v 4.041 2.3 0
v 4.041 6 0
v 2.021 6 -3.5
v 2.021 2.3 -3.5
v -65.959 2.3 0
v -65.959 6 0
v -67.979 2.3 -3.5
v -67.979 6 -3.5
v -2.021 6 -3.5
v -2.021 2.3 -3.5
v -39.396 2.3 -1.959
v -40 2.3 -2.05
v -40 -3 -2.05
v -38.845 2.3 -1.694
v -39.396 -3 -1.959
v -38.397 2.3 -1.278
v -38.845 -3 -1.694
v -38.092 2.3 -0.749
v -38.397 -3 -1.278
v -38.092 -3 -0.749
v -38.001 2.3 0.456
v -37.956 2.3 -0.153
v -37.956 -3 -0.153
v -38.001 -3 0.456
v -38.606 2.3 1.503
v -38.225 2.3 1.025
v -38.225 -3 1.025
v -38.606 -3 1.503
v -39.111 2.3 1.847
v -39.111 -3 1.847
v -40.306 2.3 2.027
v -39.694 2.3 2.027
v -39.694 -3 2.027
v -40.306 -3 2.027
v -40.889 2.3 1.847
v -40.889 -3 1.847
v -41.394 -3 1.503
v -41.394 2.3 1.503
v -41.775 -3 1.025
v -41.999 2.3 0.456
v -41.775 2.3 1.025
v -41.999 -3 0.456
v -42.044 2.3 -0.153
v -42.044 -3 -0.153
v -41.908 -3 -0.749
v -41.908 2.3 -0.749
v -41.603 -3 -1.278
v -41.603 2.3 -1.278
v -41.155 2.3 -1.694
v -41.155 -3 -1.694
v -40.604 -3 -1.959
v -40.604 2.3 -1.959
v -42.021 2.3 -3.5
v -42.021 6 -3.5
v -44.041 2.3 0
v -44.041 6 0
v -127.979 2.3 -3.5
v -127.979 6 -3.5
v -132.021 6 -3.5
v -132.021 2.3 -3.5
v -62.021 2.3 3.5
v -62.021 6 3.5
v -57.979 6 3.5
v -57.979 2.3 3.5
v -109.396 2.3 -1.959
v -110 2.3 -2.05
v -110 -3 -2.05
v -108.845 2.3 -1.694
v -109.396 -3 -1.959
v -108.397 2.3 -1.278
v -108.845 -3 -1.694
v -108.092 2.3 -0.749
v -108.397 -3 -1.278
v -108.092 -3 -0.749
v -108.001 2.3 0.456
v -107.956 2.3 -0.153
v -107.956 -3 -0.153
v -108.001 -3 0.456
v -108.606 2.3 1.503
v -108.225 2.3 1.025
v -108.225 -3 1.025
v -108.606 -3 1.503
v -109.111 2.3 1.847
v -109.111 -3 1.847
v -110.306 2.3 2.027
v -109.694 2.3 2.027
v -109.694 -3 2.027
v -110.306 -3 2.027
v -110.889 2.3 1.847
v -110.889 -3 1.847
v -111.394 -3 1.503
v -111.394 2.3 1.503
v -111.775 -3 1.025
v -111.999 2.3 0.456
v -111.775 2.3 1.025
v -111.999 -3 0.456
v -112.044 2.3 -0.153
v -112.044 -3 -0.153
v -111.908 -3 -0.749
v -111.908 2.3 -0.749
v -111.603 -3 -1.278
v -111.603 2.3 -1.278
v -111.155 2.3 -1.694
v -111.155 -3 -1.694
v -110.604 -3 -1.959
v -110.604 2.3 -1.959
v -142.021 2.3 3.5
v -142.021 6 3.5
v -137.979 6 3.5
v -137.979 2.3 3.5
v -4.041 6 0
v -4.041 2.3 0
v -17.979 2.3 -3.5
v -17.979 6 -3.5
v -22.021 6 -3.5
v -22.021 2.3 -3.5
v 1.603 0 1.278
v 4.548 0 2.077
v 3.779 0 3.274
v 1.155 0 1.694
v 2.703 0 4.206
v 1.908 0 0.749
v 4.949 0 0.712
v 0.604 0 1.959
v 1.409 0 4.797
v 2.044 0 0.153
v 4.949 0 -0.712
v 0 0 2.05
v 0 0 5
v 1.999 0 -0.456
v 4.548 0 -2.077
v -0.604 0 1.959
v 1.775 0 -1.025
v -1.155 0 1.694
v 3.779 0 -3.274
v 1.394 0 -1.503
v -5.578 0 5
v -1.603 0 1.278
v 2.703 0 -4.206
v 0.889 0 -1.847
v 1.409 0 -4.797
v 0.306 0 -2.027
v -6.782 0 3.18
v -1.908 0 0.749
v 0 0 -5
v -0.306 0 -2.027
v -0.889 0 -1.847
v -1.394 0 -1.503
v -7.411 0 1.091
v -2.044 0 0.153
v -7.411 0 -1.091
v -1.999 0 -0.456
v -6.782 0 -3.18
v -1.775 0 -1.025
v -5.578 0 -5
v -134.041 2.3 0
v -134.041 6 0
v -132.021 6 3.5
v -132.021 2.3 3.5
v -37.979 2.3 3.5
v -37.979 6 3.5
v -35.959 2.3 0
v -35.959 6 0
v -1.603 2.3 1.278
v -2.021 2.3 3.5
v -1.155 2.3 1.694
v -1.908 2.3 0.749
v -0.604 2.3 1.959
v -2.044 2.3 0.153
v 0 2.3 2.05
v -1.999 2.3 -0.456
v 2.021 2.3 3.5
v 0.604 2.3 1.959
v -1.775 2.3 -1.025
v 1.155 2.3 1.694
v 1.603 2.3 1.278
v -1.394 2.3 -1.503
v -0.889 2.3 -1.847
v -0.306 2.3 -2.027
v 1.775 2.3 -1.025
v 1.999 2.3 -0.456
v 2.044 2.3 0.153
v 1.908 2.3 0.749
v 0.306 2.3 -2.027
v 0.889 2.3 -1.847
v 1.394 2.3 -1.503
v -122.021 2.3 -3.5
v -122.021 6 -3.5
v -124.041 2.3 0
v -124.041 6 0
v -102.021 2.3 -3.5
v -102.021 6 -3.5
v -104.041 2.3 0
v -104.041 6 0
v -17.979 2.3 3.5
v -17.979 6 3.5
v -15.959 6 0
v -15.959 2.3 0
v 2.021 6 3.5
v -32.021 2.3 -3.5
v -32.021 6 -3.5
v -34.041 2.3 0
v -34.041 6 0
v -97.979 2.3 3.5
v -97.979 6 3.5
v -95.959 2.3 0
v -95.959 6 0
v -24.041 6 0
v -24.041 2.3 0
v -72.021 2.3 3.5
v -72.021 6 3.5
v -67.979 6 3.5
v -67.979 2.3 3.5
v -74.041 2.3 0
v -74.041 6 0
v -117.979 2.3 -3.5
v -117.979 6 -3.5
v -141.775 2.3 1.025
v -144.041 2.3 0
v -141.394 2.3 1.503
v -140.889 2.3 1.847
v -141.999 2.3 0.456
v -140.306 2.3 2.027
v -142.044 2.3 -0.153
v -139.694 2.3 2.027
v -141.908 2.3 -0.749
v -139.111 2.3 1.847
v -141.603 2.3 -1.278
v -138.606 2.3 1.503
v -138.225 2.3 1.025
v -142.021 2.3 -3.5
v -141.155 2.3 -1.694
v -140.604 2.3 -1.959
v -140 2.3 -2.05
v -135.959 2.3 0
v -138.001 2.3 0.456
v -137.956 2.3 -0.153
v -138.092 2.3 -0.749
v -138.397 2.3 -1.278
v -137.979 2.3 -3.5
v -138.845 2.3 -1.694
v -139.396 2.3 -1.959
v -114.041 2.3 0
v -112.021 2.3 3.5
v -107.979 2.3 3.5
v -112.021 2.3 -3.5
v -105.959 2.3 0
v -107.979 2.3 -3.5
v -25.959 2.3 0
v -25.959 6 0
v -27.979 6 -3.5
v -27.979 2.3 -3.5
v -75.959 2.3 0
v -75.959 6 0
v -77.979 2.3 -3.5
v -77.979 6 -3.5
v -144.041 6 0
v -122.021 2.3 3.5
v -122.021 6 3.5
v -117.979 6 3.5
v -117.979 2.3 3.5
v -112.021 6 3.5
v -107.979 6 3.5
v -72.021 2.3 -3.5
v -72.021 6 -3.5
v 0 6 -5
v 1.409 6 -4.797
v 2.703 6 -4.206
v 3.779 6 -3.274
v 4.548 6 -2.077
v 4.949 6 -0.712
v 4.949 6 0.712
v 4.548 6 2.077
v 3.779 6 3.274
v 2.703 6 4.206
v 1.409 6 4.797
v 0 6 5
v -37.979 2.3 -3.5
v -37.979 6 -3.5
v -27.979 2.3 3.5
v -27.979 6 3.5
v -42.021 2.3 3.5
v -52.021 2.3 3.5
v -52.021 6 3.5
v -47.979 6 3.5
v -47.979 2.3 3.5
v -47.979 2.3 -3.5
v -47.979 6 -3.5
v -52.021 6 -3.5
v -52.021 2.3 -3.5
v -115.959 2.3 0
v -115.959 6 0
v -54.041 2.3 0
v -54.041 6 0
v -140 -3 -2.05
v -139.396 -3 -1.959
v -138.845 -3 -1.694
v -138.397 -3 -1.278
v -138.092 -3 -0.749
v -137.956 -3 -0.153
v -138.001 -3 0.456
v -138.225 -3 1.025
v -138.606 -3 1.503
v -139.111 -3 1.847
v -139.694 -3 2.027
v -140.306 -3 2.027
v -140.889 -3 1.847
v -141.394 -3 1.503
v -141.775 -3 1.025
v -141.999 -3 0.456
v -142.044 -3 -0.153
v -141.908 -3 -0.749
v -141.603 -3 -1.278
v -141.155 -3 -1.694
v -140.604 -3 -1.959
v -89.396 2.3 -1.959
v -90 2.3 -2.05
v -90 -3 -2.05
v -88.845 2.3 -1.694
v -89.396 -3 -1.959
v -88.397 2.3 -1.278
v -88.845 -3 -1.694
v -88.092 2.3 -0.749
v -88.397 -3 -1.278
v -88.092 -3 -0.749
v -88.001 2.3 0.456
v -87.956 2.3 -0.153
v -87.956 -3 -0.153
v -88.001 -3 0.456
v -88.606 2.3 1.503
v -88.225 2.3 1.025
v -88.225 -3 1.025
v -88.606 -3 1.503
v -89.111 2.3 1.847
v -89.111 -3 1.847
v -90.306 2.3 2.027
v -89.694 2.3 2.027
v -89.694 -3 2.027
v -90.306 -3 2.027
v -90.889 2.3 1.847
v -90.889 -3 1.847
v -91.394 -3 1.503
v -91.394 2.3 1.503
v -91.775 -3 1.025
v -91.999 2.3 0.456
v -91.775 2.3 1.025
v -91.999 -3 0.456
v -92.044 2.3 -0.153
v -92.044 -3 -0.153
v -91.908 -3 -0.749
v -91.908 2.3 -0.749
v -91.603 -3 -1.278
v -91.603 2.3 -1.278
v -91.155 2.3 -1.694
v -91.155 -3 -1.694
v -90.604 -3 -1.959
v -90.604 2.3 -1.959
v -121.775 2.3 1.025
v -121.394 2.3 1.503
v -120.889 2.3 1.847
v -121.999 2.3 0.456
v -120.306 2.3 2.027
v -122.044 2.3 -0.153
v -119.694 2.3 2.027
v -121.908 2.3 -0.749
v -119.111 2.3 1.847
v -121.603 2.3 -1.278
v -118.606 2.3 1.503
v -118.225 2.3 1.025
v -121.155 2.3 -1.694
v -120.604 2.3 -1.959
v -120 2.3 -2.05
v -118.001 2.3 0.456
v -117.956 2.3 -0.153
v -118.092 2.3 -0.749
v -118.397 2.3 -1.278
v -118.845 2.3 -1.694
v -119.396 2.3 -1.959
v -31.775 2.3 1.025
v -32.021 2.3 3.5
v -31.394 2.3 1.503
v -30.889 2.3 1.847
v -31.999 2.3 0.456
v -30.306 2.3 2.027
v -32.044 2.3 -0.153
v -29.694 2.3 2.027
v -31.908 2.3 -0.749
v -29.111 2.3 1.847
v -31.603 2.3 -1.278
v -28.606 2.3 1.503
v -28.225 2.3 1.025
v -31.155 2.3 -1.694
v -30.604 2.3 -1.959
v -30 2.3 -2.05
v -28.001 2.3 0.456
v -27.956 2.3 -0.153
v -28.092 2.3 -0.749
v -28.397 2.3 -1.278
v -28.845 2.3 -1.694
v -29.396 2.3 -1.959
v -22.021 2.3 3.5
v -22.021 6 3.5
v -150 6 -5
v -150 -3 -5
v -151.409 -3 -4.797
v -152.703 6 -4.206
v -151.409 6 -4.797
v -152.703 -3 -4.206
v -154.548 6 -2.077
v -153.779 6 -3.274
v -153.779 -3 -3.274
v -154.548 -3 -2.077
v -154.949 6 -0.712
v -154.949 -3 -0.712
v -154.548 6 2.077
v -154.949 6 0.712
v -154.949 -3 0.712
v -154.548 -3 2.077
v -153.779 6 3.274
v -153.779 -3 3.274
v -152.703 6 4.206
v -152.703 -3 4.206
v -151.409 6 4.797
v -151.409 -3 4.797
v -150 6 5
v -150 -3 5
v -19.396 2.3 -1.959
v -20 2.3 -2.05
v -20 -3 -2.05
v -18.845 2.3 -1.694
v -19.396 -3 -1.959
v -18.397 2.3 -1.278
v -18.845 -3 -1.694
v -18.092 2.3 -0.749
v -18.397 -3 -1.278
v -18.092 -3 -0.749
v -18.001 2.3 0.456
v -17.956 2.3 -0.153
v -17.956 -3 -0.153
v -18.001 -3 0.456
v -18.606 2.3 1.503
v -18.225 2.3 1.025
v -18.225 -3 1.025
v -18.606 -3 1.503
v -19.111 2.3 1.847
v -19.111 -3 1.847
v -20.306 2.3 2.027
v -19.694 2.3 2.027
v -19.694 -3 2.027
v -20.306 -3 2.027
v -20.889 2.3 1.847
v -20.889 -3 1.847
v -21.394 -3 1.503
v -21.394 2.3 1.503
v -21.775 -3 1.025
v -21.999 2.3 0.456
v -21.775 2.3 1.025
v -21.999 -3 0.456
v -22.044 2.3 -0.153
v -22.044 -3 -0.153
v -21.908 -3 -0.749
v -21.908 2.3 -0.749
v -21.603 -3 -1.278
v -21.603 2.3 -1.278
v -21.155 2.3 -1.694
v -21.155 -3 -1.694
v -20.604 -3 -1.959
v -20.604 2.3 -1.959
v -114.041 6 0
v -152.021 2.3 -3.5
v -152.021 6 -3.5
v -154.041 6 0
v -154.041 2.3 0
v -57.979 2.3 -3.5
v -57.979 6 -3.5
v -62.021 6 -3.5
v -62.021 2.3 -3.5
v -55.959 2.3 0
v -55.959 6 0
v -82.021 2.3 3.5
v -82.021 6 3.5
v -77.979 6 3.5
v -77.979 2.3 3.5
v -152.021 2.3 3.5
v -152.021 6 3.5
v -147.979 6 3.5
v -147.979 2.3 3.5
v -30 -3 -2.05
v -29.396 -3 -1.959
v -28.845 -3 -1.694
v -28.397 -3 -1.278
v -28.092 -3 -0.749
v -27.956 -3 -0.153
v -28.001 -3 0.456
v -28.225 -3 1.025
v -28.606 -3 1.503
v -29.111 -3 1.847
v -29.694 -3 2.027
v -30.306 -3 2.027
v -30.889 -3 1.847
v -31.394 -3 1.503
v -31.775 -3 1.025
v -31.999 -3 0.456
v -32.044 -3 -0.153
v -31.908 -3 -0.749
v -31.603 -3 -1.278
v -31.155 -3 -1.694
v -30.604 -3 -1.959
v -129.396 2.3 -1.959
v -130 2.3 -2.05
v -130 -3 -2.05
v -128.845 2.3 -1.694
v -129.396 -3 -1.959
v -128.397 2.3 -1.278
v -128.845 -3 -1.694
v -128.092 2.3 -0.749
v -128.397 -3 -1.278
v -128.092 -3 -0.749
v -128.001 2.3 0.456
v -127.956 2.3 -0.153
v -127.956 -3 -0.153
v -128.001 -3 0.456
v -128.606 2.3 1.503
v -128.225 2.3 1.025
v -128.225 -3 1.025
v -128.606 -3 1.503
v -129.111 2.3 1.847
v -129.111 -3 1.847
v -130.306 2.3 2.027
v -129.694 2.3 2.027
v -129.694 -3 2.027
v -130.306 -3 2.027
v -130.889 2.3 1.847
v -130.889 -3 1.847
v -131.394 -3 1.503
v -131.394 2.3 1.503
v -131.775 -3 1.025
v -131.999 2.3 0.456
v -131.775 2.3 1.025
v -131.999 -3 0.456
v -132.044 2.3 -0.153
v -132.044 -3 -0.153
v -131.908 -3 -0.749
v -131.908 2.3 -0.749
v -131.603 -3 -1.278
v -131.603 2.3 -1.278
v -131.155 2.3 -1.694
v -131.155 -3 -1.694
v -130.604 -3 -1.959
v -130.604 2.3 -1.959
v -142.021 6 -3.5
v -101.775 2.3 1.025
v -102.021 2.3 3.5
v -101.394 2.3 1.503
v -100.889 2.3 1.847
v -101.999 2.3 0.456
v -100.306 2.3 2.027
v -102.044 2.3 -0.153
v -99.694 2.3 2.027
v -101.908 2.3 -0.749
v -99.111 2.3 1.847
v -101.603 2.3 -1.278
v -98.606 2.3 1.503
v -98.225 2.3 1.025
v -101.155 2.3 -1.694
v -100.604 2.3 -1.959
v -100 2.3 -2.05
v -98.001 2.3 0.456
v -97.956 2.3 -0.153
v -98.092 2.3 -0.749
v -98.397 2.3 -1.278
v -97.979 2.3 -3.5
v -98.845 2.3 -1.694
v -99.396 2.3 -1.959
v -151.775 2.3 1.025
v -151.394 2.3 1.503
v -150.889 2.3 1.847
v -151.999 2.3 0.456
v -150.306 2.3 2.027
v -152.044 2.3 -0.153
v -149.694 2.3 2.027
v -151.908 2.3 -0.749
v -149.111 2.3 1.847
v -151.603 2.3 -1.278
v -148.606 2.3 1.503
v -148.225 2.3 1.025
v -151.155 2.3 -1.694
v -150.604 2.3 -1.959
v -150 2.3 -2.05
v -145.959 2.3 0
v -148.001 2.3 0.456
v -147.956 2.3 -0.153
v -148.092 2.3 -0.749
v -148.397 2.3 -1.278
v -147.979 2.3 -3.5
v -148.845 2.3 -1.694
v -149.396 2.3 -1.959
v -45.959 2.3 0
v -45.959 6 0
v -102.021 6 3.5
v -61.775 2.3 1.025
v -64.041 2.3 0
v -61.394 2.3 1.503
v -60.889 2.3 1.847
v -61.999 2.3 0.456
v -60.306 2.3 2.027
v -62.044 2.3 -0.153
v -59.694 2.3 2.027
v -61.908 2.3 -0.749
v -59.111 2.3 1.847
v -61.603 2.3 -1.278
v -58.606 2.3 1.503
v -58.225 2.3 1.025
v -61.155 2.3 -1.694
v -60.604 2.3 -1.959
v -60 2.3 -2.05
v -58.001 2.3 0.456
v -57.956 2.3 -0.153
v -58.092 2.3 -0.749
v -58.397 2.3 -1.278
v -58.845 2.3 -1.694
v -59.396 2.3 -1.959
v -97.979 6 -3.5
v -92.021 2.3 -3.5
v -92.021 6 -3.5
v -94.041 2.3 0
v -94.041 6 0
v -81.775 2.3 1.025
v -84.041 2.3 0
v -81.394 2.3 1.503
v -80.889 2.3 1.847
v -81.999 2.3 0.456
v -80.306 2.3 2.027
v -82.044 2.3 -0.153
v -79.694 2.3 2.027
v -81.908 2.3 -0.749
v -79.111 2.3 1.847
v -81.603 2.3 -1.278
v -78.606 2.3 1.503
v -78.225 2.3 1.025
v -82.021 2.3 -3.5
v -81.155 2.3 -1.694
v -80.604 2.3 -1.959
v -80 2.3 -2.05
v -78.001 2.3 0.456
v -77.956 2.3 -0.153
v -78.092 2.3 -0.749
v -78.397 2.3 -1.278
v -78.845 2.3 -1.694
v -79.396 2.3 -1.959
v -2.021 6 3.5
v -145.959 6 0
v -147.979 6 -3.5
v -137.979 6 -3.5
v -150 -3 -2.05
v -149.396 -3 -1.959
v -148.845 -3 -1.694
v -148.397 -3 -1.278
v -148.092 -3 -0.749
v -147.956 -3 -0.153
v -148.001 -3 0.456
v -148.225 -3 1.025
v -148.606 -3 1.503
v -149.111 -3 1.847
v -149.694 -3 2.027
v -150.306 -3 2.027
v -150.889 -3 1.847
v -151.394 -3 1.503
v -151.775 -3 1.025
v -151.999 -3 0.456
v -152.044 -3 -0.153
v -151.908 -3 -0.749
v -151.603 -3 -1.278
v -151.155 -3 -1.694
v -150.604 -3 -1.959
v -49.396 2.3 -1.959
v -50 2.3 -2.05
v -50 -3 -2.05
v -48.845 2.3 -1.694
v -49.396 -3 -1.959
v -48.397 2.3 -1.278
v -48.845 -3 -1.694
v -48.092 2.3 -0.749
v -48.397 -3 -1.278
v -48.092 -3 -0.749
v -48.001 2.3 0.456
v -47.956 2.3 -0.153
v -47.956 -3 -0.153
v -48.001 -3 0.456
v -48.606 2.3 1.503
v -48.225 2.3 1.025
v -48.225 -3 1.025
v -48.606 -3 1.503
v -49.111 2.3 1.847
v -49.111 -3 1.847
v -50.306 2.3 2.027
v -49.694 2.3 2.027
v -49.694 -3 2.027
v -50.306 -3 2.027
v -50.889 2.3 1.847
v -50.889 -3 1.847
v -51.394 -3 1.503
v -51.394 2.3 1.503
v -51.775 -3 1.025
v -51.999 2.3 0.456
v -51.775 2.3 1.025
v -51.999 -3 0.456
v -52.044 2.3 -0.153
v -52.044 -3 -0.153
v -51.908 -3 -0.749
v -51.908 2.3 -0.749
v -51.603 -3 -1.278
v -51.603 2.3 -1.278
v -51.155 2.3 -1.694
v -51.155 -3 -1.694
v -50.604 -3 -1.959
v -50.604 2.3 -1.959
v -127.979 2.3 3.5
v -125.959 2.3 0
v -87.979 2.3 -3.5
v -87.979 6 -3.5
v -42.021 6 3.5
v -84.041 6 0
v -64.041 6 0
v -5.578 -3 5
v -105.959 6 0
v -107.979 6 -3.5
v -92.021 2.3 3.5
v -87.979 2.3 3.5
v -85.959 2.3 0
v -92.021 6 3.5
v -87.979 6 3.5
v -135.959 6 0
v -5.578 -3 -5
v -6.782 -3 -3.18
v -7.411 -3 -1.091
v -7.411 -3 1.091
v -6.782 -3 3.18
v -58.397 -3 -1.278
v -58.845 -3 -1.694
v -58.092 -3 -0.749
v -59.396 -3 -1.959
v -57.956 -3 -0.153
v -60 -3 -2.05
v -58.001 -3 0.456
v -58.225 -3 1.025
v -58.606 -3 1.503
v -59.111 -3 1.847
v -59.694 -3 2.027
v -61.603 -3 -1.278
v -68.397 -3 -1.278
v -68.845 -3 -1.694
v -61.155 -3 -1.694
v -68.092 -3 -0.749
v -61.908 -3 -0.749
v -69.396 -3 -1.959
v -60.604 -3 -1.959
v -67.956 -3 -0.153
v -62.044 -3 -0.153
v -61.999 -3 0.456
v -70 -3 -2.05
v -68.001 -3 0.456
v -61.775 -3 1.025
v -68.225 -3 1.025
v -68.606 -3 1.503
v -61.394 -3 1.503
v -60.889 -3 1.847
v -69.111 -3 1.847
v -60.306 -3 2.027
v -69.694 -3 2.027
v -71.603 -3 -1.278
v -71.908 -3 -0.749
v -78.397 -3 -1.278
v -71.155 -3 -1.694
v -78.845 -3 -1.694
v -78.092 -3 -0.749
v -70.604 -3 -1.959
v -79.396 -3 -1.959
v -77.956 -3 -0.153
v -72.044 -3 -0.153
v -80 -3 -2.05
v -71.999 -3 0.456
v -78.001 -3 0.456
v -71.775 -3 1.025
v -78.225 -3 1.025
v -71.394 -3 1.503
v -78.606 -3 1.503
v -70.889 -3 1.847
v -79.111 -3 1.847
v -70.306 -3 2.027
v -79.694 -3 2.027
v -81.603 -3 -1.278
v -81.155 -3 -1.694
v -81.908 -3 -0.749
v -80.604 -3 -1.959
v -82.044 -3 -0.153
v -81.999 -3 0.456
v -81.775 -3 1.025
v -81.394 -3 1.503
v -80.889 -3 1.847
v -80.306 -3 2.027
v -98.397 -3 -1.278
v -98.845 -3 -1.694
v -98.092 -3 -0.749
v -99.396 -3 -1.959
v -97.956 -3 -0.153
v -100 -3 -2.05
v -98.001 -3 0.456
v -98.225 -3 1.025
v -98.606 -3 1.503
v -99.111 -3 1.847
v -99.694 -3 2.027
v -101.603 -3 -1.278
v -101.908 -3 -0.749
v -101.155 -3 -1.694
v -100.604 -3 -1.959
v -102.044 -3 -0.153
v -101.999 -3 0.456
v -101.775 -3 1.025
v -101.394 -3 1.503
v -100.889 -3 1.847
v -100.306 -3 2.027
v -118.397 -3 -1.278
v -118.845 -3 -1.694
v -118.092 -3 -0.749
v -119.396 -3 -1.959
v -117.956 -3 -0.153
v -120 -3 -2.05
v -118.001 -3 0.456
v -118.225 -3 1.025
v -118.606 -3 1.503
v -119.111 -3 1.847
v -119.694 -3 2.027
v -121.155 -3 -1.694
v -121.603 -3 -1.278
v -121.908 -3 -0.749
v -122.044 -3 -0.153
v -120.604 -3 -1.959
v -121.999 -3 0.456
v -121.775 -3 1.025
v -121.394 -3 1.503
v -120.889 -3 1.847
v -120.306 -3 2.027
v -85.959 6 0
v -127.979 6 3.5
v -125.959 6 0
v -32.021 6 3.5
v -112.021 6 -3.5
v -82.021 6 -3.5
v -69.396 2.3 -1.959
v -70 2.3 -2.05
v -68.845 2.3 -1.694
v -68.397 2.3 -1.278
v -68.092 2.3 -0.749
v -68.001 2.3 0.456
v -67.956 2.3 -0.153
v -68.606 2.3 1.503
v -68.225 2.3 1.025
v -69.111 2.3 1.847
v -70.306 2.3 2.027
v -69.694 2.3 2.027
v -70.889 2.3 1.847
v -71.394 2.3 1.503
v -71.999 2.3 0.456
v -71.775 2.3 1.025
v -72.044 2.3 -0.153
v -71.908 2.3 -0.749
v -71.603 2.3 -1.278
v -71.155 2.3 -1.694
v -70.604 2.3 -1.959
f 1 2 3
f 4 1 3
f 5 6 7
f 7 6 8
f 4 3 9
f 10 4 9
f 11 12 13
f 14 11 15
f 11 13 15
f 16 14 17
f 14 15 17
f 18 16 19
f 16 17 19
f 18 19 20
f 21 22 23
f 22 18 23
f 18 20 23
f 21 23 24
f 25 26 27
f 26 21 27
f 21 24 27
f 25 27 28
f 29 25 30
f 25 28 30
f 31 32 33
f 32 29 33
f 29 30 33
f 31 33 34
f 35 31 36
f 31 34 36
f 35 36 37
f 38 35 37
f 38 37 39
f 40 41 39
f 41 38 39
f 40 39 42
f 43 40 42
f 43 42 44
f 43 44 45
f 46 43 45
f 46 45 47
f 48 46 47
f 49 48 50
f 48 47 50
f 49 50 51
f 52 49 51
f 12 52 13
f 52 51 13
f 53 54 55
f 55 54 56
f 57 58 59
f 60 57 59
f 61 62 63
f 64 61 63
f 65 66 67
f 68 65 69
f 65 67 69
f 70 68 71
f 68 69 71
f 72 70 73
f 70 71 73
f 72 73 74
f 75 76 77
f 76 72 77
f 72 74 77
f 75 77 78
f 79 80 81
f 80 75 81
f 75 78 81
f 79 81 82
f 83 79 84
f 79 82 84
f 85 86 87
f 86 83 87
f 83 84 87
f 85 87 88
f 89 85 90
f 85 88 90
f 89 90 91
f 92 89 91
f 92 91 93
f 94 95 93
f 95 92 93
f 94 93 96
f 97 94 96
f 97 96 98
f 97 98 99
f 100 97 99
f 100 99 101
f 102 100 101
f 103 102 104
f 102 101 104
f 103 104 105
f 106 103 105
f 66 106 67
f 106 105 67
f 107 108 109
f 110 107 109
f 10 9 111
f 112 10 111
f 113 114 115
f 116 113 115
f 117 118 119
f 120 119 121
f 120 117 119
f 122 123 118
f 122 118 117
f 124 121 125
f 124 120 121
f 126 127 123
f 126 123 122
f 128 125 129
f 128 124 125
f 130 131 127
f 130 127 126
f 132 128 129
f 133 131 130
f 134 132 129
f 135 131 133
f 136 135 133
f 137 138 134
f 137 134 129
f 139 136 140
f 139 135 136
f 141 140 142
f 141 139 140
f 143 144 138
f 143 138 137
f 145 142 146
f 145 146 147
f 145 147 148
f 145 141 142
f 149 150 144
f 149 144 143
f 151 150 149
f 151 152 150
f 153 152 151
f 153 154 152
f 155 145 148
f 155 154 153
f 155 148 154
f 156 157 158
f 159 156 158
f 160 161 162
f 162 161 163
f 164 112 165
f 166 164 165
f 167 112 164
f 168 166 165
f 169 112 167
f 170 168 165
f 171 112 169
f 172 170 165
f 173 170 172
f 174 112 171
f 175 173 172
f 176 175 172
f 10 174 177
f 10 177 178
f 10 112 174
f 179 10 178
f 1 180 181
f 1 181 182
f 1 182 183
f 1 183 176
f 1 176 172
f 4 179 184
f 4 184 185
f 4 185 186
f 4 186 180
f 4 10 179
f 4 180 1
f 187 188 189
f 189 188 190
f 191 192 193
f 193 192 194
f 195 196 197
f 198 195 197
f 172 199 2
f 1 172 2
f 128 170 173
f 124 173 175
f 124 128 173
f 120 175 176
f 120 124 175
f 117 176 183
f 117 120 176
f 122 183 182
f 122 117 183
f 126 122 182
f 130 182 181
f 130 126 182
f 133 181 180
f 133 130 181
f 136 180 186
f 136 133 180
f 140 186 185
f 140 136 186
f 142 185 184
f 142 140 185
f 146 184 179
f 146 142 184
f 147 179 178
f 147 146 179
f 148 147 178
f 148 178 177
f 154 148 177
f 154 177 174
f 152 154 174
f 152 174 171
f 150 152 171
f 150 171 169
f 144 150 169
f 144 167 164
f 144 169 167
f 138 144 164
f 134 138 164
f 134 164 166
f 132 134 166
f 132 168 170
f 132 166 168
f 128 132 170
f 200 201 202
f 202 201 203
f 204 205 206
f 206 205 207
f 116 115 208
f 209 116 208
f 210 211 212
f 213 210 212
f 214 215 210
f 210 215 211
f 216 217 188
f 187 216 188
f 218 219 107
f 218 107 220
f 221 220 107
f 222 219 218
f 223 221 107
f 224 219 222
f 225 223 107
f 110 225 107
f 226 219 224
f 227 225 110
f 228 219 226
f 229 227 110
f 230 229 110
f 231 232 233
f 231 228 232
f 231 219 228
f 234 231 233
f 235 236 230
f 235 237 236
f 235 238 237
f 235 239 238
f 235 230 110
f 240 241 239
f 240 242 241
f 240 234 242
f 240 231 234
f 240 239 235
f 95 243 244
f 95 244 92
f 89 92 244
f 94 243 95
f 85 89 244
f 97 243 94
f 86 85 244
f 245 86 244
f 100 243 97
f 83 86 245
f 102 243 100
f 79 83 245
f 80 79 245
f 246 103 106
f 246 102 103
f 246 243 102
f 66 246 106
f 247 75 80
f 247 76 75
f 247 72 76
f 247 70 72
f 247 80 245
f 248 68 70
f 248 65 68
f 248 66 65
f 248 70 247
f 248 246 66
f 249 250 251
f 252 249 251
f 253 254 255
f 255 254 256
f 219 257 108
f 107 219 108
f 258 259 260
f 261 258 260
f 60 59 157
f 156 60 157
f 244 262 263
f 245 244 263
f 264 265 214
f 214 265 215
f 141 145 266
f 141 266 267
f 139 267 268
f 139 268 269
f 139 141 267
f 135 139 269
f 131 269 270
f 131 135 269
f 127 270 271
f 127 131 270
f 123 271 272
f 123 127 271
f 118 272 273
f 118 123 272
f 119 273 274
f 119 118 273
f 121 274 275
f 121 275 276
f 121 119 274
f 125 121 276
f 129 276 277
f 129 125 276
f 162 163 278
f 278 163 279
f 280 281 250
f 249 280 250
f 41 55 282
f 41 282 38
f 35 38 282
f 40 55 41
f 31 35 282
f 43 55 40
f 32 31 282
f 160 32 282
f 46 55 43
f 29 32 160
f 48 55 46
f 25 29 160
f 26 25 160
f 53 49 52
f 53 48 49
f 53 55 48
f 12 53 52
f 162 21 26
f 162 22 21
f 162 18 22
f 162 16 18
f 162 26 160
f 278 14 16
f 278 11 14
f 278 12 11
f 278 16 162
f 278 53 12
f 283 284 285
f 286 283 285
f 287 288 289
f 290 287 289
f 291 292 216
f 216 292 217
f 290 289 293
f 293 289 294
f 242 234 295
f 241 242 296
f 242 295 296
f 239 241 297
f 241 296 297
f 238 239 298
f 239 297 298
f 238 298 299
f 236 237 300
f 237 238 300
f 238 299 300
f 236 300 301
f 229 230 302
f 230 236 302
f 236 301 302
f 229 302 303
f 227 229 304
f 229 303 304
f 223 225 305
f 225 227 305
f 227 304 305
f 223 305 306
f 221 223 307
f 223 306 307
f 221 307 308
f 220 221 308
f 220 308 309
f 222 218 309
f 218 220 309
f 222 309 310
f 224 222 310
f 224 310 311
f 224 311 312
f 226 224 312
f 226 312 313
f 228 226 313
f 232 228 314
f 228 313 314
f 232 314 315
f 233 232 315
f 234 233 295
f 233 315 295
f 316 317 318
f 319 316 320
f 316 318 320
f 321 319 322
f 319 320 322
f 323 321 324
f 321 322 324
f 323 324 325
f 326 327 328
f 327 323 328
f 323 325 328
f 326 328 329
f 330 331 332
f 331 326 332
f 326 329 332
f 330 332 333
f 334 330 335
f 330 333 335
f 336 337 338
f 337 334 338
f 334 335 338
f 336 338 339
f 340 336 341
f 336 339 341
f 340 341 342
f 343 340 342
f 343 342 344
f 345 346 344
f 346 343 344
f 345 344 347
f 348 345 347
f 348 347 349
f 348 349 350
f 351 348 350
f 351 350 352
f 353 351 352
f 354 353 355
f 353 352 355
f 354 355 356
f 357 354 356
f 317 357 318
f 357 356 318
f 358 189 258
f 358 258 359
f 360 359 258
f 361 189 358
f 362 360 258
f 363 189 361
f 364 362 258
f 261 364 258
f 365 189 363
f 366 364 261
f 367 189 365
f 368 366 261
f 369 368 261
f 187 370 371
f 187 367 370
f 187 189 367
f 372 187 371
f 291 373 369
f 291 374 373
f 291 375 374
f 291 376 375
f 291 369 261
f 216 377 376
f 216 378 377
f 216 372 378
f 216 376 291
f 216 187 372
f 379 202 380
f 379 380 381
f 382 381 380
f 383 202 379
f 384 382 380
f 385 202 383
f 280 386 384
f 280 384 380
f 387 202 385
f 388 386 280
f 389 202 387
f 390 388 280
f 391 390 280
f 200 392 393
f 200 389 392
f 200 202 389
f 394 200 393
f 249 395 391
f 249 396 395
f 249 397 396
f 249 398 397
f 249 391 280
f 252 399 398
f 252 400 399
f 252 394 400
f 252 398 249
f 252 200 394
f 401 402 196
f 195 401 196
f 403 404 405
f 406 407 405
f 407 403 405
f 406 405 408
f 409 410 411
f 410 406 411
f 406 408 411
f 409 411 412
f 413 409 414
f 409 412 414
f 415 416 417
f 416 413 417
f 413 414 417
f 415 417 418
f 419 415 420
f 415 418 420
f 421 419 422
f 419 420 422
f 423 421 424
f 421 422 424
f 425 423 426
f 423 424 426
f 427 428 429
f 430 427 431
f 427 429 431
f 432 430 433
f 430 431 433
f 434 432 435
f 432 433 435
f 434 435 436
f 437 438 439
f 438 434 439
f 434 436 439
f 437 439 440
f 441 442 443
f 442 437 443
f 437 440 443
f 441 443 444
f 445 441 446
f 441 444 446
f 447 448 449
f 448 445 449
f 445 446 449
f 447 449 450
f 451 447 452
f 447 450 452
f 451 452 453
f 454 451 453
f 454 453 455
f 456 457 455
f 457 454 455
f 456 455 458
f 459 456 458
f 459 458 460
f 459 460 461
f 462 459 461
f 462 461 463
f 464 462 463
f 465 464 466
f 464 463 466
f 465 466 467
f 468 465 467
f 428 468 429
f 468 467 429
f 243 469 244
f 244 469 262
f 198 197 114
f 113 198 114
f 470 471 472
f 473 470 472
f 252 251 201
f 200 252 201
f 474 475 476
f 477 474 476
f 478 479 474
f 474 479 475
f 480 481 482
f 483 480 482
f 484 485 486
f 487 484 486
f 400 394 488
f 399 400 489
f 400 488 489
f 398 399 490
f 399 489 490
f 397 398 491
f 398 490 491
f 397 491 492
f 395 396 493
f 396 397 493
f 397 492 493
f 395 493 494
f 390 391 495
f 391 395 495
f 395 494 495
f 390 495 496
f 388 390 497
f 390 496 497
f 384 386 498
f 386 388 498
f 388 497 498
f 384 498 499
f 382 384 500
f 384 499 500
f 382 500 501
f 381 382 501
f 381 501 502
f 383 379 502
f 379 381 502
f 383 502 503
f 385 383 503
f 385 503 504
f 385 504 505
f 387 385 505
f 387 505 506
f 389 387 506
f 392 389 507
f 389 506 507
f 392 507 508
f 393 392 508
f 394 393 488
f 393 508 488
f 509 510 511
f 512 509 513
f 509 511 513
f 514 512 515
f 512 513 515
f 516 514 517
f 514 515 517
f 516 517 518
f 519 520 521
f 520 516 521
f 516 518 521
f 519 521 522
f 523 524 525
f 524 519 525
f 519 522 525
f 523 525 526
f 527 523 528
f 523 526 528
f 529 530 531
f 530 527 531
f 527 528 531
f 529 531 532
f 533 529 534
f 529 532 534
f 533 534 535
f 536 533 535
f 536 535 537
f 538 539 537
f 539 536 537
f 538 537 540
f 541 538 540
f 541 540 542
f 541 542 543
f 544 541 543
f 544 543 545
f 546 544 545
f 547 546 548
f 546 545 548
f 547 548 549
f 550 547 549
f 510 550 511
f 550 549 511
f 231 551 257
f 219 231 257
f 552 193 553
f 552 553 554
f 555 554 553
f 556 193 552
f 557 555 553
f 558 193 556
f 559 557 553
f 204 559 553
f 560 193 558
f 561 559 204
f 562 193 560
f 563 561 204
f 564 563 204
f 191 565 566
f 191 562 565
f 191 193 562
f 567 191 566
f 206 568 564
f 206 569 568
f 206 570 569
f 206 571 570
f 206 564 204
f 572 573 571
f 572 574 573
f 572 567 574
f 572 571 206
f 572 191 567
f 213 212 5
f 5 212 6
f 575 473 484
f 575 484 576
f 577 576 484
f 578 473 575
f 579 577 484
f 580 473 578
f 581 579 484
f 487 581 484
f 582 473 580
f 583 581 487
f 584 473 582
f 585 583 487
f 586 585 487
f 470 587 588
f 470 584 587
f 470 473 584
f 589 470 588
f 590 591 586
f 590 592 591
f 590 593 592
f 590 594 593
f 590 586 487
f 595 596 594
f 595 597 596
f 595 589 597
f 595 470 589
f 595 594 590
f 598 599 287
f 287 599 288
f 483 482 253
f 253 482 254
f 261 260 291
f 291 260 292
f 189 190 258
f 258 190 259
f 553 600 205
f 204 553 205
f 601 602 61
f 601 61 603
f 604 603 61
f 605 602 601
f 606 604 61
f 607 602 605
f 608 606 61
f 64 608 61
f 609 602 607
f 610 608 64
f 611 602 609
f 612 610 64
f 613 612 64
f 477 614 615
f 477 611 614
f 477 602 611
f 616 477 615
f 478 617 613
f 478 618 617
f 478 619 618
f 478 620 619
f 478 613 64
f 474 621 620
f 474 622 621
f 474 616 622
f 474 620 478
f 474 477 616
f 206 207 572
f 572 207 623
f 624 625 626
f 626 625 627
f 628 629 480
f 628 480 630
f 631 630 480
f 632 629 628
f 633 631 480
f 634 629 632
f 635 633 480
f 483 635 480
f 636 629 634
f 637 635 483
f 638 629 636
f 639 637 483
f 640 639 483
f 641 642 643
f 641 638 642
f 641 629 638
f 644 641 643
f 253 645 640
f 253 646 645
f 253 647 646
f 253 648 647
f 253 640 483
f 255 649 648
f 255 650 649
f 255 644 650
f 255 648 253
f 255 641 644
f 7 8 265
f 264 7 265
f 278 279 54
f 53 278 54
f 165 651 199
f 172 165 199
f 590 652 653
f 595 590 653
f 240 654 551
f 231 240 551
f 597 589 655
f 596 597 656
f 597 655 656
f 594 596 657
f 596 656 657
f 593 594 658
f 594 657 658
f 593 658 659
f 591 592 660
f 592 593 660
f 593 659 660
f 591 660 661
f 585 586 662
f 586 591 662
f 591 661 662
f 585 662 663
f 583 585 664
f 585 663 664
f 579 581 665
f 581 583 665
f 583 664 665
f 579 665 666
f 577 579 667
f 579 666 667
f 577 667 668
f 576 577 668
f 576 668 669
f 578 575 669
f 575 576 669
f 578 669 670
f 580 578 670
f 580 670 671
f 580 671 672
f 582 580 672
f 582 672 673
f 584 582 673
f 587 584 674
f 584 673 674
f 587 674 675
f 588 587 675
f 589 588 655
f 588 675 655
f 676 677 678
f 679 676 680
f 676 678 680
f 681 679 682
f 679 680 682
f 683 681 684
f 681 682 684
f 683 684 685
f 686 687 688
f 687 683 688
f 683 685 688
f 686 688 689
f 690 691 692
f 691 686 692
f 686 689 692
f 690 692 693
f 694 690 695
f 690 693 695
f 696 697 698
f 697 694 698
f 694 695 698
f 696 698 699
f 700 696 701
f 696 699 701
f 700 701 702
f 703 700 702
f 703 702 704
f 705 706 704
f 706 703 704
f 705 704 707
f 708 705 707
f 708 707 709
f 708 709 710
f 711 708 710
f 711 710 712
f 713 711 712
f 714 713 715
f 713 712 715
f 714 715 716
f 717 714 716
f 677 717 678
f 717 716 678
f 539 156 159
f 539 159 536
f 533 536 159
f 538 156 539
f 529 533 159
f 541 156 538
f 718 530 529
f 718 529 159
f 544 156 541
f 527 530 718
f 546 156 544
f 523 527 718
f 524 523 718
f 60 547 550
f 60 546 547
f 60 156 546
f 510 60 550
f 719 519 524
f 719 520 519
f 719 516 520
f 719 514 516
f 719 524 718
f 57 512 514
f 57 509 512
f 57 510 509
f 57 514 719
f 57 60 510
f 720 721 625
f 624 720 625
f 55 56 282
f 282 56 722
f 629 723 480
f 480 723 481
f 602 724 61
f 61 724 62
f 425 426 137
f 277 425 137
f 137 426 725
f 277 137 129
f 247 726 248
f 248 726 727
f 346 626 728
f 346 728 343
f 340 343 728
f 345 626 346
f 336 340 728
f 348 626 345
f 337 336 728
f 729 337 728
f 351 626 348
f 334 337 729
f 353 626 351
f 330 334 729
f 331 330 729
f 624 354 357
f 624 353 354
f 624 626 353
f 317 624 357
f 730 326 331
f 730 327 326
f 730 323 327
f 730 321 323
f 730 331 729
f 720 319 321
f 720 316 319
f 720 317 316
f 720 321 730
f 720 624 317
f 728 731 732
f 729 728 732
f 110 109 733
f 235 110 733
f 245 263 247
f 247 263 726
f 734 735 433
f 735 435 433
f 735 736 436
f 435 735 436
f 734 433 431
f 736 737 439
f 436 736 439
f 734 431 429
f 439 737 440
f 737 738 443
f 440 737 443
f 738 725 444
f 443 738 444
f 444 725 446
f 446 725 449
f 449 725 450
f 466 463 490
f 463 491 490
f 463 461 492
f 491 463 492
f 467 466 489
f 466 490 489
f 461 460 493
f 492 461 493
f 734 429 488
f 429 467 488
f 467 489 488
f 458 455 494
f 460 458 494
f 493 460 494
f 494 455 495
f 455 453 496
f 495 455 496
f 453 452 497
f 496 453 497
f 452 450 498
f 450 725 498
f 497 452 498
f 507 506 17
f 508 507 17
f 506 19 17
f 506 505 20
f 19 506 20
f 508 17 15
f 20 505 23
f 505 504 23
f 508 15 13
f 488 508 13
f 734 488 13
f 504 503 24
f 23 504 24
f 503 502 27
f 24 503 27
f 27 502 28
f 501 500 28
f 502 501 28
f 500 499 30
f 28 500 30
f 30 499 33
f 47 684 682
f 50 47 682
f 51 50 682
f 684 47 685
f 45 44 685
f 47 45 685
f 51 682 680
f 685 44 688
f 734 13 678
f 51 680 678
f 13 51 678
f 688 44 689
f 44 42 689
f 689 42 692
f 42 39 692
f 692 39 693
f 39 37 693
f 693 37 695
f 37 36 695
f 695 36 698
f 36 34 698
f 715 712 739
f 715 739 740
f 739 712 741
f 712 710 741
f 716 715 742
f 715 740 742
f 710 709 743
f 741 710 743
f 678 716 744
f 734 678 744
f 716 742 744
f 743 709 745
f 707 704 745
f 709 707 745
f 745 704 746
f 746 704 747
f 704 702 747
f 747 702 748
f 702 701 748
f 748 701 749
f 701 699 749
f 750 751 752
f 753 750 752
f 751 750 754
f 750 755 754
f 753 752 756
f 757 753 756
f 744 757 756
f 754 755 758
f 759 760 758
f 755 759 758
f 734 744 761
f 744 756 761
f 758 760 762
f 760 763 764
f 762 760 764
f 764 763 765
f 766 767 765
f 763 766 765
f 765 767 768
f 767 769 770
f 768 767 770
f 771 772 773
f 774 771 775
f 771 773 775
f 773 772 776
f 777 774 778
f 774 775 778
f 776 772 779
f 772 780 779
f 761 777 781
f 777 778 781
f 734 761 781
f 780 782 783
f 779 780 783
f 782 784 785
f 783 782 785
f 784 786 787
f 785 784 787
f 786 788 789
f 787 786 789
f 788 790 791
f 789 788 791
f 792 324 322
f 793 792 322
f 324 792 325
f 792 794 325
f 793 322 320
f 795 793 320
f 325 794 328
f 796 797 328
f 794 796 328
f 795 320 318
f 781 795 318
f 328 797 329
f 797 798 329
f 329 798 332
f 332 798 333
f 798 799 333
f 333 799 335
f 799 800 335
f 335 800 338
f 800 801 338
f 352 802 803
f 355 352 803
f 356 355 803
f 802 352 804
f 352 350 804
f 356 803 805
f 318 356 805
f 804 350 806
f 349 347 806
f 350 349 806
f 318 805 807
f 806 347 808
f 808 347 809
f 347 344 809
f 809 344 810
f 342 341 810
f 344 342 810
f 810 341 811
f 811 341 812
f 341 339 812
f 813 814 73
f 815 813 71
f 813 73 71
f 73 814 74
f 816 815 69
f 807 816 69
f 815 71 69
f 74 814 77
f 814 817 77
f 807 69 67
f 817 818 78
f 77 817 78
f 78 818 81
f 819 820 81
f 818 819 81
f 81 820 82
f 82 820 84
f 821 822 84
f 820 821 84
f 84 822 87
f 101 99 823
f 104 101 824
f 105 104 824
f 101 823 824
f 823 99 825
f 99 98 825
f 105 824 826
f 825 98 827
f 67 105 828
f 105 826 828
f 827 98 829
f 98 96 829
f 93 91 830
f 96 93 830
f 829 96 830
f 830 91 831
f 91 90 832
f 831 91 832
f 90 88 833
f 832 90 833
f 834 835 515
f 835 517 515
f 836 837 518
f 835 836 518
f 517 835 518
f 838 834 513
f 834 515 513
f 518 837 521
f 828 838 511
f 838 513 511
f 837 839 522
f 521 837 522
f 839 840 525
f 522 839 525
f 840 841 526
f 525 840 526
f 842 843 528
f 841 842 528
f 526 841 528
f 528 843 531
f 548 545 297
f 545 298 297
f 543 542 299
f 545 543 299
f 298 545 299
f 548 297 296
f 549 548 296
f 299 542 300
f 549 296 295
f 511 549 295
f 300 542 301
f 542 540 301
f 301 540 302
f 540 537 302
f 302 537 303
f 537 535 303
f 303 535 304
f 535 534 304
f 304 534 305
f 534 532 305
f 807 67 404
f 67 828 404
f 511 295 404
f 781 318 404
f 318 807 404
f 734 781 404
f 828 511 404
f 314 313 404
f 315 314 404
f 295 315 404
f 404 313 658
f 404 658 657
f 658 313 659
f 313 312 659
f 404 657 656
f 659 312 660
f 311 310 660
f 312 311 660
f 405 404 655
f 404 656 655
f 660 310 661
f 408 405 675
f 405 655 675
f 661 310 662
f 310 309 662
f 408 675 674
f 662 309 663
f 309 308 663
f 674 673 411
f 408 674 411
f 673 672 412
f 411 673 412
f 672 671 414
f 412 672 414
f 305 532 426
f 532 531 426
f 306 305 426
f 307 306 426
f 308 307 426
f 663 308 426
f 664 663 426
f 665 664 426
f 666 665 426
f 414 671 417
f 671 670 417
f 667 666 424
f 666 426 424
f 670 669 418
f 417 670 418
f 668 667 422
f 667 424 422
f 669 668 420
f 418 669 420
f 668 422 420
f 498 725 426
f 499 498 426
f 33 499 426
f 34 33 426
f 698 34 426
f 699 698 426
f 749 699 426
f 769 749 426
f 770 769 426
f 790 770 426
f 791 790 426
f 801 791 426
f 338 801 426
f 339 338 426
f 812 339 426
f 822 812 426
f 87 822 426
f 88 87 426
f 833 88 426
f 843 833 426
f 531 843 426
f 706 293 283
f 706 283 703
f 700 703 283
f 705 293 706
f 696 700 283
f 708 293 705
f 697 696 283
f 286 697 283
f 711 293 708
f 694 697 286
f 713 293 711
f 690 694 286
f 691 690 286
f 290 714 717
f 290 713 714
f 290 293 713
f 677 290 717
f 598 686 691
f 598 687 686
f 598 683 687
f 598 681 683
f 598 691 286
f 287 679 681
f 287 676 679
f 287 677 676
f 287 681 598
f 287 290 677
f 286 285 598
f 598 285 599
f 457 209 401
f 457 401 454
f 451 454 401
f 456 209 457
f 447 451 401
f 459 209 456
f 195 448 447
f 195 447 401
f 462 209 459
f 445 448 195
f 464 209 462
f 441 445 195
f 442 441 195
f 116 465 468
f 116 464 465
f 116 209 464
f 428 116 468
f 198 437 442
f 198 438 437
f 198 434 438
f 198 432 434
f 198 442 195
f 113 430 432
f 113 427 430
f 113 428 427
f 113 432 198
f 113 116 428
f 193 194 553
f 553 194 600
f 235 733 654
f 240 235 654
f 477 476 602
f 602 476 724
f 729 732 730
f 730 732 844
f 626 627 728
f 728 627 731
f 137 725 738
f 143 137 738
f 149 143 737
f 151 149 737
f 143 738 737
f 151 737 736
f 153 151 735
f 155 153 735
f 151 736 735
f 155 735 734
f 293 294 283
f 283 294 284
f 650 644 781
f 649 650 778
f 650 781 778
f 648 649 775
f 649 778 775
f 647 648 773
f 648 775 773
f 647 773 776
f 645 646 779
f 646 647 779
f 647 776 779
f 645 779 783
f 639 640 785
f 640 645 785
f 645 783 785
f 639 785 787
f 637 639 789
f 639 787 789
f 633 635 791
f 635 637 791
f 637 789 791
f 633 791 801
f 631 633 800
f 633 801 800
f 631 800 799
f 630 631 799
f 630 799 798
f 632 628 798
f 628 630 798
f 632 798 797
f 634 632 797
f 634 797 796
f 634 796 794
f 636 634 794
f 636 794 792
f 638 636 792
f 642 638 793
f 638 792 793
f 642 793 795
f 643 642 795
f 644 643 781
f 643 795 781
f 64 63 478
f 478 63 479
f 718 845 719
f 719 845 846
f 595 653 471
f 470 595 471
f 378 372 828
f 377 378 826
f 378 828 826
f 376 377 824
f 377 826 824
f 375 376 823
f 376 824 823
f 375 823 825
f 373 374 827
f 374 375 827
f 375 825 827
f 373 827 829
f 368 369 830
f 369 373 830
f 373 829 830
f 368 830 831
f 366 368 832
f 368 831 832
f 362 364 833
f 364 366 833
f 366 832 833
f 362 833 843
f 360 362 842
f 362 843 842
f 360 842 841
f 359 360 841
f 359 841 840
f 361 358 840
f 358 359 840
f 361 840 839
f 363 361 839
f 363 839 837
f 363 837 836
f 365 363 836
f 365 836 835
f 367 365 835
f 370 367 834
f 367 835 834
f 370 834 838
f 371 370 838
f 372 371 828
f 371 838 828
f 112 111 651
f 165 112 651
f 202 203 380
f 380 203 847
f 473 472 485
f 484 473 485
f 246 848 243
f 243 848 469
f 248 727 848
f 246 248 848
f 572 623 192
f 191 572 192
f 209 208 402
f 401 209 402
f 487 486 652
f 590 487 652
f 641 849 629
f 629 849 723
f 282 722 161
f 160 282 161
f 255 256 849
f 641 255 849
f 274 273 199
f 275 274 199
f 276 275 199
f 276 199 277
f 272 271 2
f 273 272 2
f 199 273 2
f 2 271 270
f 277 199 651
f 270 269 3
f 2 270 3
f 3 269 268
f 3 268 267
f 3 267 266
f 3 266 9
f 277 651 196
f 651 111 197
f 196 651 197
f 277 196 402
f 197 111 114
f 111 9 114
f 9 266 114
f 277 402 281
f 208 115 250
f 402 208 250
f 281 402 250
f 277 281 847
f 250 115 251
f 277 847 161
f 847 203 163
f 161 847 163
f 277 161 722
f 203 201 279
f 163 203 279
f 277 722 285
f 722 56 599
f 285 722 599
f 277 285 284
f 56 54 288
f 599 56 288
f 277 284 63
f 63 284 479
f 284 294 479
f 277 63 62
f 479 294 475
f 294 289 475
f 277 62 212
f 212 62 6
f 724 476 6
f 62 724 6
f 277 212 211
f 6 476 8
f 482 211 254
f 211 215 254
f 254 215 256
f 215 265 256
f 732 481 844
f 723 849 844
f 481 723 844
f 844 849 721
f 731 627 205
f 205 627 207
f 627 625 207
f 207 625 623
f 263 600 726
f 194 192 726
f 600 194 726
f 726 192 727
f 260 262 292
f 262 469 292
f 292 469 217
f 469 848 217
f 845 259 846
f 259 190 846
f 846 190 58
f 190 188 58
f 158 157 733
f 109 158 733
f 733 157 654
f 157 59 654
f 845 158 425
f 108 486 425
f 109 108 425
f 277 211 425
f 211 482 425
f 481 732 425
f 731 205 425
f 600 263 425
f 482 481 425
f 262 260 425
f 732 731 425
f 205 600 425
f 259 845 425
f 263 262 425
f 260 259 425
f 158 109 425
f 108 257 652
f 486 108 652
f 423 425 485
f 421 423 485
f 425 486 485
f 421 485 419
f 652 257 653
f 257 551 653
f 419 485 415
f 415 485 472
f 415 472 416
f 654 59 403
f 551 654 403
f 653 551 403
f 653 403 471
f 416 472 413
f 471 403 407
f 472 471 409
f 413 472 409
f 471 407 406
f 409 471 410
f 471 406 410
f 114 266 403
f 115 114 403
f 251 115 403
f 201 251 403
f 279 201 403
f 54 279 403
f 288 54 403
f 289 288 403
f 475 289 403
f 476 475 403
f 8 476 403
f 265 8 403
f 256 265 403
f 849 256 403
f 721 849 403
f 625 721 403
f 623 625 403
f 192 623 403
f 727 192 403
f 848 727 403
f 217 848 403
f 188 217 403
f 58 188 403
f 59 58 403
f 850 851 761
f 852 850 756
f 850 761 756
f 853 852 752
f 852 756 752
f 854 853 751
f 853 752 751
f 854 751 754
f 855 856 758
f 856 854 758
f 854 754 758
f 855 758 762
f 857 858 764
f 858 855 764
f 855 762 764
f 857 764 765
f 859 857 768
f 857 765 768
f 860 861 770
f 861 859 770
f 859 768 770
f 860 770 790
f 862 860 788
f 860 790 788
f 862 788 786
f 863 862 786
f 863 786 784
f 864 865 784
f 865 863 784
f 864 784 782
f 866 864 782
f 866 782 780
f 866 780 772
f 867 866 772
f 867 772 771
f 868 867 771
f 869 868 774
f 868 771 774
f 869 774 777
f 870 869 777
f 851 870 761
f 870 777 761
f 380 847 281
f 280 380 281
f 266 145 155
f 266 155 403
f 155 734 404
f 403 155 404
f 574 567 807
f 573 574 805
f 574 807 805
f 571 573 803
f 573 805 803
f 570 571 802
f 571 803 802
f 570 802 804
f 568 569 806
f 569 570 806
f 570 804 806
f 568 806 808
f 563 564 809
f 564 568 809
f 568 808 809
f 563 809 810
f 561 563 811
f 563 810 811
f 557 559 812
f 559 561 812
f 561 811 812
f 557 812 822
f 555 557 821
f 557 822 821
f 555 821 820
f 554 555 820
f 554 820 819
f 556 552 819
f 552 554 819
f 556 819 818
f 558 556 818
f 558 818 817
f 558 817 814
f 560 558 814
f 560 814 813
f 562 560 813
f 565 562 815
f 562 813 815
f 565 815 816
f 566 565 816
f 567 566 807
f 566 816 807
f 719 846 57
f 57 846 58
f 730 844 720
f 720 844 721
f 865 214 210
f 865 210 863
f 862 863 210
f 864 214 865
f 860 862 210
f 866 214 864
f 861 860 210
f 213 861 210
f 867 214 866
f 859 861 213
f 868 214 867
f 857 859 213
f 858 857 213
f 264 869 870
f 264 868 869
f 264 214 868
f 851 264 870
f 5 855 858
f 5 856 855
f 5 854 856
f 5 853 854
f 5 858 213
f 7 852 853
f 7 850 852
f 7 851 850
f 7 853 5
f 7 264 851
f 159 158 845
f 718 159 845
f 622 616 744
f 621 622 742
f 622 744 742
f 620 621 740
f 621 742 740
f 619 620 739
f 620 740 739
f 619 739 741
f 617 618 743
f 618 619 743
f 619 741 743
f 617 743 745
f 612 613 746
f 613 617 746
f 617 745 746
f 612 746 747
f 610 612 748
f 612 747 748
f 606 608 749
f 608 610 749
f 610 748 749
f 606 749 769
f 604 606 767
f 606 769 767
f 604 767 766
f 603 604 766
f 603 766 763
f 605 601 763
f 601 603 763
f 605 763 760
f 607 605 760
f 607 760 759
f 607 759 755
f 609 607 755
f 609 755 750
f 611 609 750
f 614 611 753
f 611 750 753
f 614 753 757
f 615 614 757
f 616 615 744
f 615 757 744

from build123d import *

# Parameters (mm, degrees)
SKETCH1_R           = 2.05
BOSS_EXTRUDE1_DEPTH = 6
CUT_EXTRUDE1_DEPTH  = 3.7
BOSS_EXTRUDE2_START = 3
BOSS_EXTRUDE2_DEPTH = 3
SKETCH5_R           = 2.05
CUT_EXTRUDE2_DEPTH  = 156.341559153


with BuildPart() as part:
    # Sketch1 → Boss-Extrude1 (new body)
    with BuildSketch(Plane(origin=(0, 0, 0), x_dir=(1, 0, 0), z_dir=(0, 1, 0))):
        with BuildLine():
            Line((0, -5), (-150, -5))
            ThreePointArc((-150, -5), (-155, 0), (-150, 5))
            Line((-150, 5), (0, 5))
            ThreePointArc((0, 5), (5, 0), (0, -5))
        make_face()
        with Locations(Location((0, 0, 0), (0, 0, 270))):
            Circle(SKETCH1_R, mode=Mode.SUBTRACT)
        with Locations(Location((-50, 0, 0), (0, 0, 270))):
            Circle(SKETCH1_R, mode=Mode.SUBTRACT)
        with Locations(Location((-60, 0, 0), (0, 0, 270))):
            Circle(SKETCH1_R, mode=Mode.SUBTRACT)
        with Locations(Location((-70, 0, 0), (0, 0, 270))):
            Circle(SKETCH1_R, mode=Mode.SUBTRACT)
        with Locations(Location((-80, 0, 0), (0, 0, 270))):
            Circle(SKETCH1_R, mode=Mode.SUBTRACT)
        with Locations(Location((-90, 0, 0), (0, 0, 270))):
            Circle(SKETCH1_R, mode=Mode.SUBTRACT)
        with Locations(Location((-100, 0, 0), (0, 0, 270))):
            Circle(SKETCH1_R, mode=Mode.SUBTRACT)
        with Locations(Location((-110, 0, 0), (0, 0, 270))):
            Circle(SKETCH1_R, mode=Mode.SUBTRACT)
        with Locations(Location((-120, 0, 0), (0, 0, 270))):
            Circle(SKETCH1_R, mode=Mode.SUBTRACT)
        with Locations(Location((-130, 0, 0), (0, 0, 270))):
            Circle(SKETCH1_R, mode=Mode.SUBTRACT)
        with Locations(Location((-140, 0, 0), (0, 0, 270))):
            Circle(SKETCH1_R, mode=Mode.SUBTRACT)
        with Locations(Location((-150, 0, 0), (0, 0, 270))):
            Circle(SKETCH1_R, mode=Mode.SUBTRACT)
        with Locations(Location((-20, 0, 0), (0, 0, 270))):
            Circle(SKETCH1_R, mode=Mode.SUBTRACT)
        with Locations(Location((-30, 0, 0), (0, 0, 270))):
            Circle(SKETCH1_R, mode=Mode.SUBTRACT)
        with Locations(Location((-40, 0, 0), (0, 0, 270))):
            Circle(SKETCH1_R, mode=Mode.SUBTRACT)
    extrude(amount=BOSS_EXTRUDE1_DEPTH)

    # Sketch2 → Cut-Extrude1 (cut)
    with BuildSketch(Plane(origin=(0, 6, 0), x_dir=(1, 0, 0), z_dir=(0, 1, 0))):
        Polygon((4.041451884, 0), (2.020725942, 3.5), (-2.020725942, 3.5), (-4.041451884, 0), (-2.020725942, -3.5), (2.020725942, -3.5), align=None)
        Polygon((-45.958548116, 0), (-47.979274058, 3.5), (-52.020725942, 3.5), (-54.041451884, 0), (-52.020725942, -3.5), (-47.979274058, -3.5), align=None)
        Polygon((-55.958548116, 0), (-57.979274058, 3.5), (-62.020725942, 3.5), (-64.041451884, 0), (-62.020725942, -3.5), (-57.979274058, -3.5), align=None)
        Polygon((-65.958548116, 0), (-67.979274058, 3.5), (-72.020725942, 3.5), (-74.041451884, 0), (-72.020725942, -3.5), (-67.979274058, -3.5), align=None)
        Polygon((-75.958548116, 0), (-77.979274058, 3.5), (-82.020725942, 3.5), (-84.041451884, 0), (-82.020725942, -3.5), (-77.979274058, -3.5), align=None)
        Polygon((-85.958548116, 0), (-87.979274058, 3.5), (-92.020725942, 3.5), (-94.041451884, 0), (-92.020725942, -3.5), (-87.979274058, -3.5), align=None)
        Polygon((-95.958548116, 0), (-97.979274058, 3.5), (-102.020725942, 3.5), (-104.041451884, 0), (-102.020725942, -3.5), (-97.979274058, -3.5), align=None)
        Polygon((-105.958548116, 0), (-107.979274058, 3.5), (-112.020725942, 3.5), (-114.041451884, 0), (-112.020725942, -3.5), (-107.979274058, -3.5), align=None)
        Polygon((-115.958548116, 0), (-117.979274058, 3.5), (-122.020725942, 3.5), (-124.041451884, 0), (-122.020725942, -3.5), (-117.979274058, -3.5), align=None)
        Polygon((-125.958548116, 0), (-127.979274058, 3.5), (-132.020725942, 3.5), (-134.041451884, 0), (-132.020725942, -3.5), (-127.979274058, -3.5), align=None)
        Polygon((-135.958548116, 0), (-137.979274058, 3.5), (-142.020725942, 3.5), (-144.041451884, 0), (-142.020725942, -3.5), (-137.979274058, -3.5), align=None)
        Polygon((-145.958548116, 0), (-147.979274058, 3.5), (-152.020725942, 3.5), (-154.041451884, 0), (-152.020725942, -3.5), (-147.979274058, -3.5), align=None)
        Polygon((-15.958548116, 0), (-17.979274058, 3.5), (-22.020725942, 3.5), (-24.041451884, 0), (-22.020725942, -3.5), (-17.979274058, -3.5), align=None)
        Polygon((-25.958548116, 0), (-27.979274058, 3.5), (-32.020725942, 3.5), (-34.041451884, 0), (-32.020725942, -3.5), (-27.979274058, -3.5), align=None)
        Polygon((-35.958548116, 0), (-37.979274058, 3.5), (-42.020725942, 3.5), (-44.041451884, 0), (-42.020725942, -3.5), (-37.979274058, -3.5), align=None)
    extrude(amount=-CUT_EXTRUDE1_DEPTH, mode=Mode.SUBTRACT)

    # Sketch4 → Boss-Extrude2 (add)
    with BuildSketch(Plane.XZ.offset(BOSS_EXTRUDE2_START)):
        with BuildLine():
            Line((-150, 5), (-5.577689938, 5))
            ThreePointArc((-5.577689938, 5), (-7.490702573, 0), (-5.577689938, -5))
            Line((-5.577689938, -5), (-150, -5))
            ThreePointArc((-150, -5), (-155, 0), (-150, 5))
        make_face()
    extrude(amount=-BOSS_EXTRUDE2_DEPTH)

    # Sketch5 → Cut-Extrude2 (cut, through all)
    with BuildSketch(Plane.XZ.offset(3)):
        with Locations(Location((-50, 0, 0), (0, 0, 270))):
            Circle(SKETCH5_R)
        with Locations(Location((-60, 0, 0), (0, 0, 270))):
            Circle(SKETCH5_R)
        with Locations(Location((-70, 0, 0), (0, 0, 270))):
            Circle(SKETCH5_R)
        with Locations(Location((-80, 0, 0), (0, 0, 270))):
            Circle(SKETCH5_R)
        with Locations(Location((-90, 0, 0), (0, 0, 270))):
            Circle(SKETCH5_R)
        with Locations(Location((-100, 0, 0), (0, 0, 270))):
            Circle(SKETCH5_R)
        with Locations(Location((-110, 0, 0), (0, 0, 270))):
            Circle(SKETCH5_R)
        with Locations(Location((-120, 0, 0), (0, 0, 270))):
            Circle(SKETCH5_R)
        with Locations(Location((-130, 0, 0), (0, 0, 270))):
            Circle(SKETCH5_R)
        with Locations(Location((-140, 0, 0), (0, 0, 270))):
            Circle(SKETCH5_R)
        with Locations(Location((-150, 0, 0), (0, 0, 270))):
            Circle(SKETCH5_R)
        with Locations(Location((-40, 0, 0), (0, 0, 270))):
            Circle(SKETCH5_R)
        with Locations(Location((-30, 0, 0), (0, 0, 270))):
            Circle(SKETCH5_R)
        with Locations(Location((-20, 0, 0), (0, 0, 270))):
            Circle(SKETCH5_R)
    extrude(amount=-CUT_EXTRUDE2_DEPTH, mode=Mode.SUBTRACT)


solid = part.part
